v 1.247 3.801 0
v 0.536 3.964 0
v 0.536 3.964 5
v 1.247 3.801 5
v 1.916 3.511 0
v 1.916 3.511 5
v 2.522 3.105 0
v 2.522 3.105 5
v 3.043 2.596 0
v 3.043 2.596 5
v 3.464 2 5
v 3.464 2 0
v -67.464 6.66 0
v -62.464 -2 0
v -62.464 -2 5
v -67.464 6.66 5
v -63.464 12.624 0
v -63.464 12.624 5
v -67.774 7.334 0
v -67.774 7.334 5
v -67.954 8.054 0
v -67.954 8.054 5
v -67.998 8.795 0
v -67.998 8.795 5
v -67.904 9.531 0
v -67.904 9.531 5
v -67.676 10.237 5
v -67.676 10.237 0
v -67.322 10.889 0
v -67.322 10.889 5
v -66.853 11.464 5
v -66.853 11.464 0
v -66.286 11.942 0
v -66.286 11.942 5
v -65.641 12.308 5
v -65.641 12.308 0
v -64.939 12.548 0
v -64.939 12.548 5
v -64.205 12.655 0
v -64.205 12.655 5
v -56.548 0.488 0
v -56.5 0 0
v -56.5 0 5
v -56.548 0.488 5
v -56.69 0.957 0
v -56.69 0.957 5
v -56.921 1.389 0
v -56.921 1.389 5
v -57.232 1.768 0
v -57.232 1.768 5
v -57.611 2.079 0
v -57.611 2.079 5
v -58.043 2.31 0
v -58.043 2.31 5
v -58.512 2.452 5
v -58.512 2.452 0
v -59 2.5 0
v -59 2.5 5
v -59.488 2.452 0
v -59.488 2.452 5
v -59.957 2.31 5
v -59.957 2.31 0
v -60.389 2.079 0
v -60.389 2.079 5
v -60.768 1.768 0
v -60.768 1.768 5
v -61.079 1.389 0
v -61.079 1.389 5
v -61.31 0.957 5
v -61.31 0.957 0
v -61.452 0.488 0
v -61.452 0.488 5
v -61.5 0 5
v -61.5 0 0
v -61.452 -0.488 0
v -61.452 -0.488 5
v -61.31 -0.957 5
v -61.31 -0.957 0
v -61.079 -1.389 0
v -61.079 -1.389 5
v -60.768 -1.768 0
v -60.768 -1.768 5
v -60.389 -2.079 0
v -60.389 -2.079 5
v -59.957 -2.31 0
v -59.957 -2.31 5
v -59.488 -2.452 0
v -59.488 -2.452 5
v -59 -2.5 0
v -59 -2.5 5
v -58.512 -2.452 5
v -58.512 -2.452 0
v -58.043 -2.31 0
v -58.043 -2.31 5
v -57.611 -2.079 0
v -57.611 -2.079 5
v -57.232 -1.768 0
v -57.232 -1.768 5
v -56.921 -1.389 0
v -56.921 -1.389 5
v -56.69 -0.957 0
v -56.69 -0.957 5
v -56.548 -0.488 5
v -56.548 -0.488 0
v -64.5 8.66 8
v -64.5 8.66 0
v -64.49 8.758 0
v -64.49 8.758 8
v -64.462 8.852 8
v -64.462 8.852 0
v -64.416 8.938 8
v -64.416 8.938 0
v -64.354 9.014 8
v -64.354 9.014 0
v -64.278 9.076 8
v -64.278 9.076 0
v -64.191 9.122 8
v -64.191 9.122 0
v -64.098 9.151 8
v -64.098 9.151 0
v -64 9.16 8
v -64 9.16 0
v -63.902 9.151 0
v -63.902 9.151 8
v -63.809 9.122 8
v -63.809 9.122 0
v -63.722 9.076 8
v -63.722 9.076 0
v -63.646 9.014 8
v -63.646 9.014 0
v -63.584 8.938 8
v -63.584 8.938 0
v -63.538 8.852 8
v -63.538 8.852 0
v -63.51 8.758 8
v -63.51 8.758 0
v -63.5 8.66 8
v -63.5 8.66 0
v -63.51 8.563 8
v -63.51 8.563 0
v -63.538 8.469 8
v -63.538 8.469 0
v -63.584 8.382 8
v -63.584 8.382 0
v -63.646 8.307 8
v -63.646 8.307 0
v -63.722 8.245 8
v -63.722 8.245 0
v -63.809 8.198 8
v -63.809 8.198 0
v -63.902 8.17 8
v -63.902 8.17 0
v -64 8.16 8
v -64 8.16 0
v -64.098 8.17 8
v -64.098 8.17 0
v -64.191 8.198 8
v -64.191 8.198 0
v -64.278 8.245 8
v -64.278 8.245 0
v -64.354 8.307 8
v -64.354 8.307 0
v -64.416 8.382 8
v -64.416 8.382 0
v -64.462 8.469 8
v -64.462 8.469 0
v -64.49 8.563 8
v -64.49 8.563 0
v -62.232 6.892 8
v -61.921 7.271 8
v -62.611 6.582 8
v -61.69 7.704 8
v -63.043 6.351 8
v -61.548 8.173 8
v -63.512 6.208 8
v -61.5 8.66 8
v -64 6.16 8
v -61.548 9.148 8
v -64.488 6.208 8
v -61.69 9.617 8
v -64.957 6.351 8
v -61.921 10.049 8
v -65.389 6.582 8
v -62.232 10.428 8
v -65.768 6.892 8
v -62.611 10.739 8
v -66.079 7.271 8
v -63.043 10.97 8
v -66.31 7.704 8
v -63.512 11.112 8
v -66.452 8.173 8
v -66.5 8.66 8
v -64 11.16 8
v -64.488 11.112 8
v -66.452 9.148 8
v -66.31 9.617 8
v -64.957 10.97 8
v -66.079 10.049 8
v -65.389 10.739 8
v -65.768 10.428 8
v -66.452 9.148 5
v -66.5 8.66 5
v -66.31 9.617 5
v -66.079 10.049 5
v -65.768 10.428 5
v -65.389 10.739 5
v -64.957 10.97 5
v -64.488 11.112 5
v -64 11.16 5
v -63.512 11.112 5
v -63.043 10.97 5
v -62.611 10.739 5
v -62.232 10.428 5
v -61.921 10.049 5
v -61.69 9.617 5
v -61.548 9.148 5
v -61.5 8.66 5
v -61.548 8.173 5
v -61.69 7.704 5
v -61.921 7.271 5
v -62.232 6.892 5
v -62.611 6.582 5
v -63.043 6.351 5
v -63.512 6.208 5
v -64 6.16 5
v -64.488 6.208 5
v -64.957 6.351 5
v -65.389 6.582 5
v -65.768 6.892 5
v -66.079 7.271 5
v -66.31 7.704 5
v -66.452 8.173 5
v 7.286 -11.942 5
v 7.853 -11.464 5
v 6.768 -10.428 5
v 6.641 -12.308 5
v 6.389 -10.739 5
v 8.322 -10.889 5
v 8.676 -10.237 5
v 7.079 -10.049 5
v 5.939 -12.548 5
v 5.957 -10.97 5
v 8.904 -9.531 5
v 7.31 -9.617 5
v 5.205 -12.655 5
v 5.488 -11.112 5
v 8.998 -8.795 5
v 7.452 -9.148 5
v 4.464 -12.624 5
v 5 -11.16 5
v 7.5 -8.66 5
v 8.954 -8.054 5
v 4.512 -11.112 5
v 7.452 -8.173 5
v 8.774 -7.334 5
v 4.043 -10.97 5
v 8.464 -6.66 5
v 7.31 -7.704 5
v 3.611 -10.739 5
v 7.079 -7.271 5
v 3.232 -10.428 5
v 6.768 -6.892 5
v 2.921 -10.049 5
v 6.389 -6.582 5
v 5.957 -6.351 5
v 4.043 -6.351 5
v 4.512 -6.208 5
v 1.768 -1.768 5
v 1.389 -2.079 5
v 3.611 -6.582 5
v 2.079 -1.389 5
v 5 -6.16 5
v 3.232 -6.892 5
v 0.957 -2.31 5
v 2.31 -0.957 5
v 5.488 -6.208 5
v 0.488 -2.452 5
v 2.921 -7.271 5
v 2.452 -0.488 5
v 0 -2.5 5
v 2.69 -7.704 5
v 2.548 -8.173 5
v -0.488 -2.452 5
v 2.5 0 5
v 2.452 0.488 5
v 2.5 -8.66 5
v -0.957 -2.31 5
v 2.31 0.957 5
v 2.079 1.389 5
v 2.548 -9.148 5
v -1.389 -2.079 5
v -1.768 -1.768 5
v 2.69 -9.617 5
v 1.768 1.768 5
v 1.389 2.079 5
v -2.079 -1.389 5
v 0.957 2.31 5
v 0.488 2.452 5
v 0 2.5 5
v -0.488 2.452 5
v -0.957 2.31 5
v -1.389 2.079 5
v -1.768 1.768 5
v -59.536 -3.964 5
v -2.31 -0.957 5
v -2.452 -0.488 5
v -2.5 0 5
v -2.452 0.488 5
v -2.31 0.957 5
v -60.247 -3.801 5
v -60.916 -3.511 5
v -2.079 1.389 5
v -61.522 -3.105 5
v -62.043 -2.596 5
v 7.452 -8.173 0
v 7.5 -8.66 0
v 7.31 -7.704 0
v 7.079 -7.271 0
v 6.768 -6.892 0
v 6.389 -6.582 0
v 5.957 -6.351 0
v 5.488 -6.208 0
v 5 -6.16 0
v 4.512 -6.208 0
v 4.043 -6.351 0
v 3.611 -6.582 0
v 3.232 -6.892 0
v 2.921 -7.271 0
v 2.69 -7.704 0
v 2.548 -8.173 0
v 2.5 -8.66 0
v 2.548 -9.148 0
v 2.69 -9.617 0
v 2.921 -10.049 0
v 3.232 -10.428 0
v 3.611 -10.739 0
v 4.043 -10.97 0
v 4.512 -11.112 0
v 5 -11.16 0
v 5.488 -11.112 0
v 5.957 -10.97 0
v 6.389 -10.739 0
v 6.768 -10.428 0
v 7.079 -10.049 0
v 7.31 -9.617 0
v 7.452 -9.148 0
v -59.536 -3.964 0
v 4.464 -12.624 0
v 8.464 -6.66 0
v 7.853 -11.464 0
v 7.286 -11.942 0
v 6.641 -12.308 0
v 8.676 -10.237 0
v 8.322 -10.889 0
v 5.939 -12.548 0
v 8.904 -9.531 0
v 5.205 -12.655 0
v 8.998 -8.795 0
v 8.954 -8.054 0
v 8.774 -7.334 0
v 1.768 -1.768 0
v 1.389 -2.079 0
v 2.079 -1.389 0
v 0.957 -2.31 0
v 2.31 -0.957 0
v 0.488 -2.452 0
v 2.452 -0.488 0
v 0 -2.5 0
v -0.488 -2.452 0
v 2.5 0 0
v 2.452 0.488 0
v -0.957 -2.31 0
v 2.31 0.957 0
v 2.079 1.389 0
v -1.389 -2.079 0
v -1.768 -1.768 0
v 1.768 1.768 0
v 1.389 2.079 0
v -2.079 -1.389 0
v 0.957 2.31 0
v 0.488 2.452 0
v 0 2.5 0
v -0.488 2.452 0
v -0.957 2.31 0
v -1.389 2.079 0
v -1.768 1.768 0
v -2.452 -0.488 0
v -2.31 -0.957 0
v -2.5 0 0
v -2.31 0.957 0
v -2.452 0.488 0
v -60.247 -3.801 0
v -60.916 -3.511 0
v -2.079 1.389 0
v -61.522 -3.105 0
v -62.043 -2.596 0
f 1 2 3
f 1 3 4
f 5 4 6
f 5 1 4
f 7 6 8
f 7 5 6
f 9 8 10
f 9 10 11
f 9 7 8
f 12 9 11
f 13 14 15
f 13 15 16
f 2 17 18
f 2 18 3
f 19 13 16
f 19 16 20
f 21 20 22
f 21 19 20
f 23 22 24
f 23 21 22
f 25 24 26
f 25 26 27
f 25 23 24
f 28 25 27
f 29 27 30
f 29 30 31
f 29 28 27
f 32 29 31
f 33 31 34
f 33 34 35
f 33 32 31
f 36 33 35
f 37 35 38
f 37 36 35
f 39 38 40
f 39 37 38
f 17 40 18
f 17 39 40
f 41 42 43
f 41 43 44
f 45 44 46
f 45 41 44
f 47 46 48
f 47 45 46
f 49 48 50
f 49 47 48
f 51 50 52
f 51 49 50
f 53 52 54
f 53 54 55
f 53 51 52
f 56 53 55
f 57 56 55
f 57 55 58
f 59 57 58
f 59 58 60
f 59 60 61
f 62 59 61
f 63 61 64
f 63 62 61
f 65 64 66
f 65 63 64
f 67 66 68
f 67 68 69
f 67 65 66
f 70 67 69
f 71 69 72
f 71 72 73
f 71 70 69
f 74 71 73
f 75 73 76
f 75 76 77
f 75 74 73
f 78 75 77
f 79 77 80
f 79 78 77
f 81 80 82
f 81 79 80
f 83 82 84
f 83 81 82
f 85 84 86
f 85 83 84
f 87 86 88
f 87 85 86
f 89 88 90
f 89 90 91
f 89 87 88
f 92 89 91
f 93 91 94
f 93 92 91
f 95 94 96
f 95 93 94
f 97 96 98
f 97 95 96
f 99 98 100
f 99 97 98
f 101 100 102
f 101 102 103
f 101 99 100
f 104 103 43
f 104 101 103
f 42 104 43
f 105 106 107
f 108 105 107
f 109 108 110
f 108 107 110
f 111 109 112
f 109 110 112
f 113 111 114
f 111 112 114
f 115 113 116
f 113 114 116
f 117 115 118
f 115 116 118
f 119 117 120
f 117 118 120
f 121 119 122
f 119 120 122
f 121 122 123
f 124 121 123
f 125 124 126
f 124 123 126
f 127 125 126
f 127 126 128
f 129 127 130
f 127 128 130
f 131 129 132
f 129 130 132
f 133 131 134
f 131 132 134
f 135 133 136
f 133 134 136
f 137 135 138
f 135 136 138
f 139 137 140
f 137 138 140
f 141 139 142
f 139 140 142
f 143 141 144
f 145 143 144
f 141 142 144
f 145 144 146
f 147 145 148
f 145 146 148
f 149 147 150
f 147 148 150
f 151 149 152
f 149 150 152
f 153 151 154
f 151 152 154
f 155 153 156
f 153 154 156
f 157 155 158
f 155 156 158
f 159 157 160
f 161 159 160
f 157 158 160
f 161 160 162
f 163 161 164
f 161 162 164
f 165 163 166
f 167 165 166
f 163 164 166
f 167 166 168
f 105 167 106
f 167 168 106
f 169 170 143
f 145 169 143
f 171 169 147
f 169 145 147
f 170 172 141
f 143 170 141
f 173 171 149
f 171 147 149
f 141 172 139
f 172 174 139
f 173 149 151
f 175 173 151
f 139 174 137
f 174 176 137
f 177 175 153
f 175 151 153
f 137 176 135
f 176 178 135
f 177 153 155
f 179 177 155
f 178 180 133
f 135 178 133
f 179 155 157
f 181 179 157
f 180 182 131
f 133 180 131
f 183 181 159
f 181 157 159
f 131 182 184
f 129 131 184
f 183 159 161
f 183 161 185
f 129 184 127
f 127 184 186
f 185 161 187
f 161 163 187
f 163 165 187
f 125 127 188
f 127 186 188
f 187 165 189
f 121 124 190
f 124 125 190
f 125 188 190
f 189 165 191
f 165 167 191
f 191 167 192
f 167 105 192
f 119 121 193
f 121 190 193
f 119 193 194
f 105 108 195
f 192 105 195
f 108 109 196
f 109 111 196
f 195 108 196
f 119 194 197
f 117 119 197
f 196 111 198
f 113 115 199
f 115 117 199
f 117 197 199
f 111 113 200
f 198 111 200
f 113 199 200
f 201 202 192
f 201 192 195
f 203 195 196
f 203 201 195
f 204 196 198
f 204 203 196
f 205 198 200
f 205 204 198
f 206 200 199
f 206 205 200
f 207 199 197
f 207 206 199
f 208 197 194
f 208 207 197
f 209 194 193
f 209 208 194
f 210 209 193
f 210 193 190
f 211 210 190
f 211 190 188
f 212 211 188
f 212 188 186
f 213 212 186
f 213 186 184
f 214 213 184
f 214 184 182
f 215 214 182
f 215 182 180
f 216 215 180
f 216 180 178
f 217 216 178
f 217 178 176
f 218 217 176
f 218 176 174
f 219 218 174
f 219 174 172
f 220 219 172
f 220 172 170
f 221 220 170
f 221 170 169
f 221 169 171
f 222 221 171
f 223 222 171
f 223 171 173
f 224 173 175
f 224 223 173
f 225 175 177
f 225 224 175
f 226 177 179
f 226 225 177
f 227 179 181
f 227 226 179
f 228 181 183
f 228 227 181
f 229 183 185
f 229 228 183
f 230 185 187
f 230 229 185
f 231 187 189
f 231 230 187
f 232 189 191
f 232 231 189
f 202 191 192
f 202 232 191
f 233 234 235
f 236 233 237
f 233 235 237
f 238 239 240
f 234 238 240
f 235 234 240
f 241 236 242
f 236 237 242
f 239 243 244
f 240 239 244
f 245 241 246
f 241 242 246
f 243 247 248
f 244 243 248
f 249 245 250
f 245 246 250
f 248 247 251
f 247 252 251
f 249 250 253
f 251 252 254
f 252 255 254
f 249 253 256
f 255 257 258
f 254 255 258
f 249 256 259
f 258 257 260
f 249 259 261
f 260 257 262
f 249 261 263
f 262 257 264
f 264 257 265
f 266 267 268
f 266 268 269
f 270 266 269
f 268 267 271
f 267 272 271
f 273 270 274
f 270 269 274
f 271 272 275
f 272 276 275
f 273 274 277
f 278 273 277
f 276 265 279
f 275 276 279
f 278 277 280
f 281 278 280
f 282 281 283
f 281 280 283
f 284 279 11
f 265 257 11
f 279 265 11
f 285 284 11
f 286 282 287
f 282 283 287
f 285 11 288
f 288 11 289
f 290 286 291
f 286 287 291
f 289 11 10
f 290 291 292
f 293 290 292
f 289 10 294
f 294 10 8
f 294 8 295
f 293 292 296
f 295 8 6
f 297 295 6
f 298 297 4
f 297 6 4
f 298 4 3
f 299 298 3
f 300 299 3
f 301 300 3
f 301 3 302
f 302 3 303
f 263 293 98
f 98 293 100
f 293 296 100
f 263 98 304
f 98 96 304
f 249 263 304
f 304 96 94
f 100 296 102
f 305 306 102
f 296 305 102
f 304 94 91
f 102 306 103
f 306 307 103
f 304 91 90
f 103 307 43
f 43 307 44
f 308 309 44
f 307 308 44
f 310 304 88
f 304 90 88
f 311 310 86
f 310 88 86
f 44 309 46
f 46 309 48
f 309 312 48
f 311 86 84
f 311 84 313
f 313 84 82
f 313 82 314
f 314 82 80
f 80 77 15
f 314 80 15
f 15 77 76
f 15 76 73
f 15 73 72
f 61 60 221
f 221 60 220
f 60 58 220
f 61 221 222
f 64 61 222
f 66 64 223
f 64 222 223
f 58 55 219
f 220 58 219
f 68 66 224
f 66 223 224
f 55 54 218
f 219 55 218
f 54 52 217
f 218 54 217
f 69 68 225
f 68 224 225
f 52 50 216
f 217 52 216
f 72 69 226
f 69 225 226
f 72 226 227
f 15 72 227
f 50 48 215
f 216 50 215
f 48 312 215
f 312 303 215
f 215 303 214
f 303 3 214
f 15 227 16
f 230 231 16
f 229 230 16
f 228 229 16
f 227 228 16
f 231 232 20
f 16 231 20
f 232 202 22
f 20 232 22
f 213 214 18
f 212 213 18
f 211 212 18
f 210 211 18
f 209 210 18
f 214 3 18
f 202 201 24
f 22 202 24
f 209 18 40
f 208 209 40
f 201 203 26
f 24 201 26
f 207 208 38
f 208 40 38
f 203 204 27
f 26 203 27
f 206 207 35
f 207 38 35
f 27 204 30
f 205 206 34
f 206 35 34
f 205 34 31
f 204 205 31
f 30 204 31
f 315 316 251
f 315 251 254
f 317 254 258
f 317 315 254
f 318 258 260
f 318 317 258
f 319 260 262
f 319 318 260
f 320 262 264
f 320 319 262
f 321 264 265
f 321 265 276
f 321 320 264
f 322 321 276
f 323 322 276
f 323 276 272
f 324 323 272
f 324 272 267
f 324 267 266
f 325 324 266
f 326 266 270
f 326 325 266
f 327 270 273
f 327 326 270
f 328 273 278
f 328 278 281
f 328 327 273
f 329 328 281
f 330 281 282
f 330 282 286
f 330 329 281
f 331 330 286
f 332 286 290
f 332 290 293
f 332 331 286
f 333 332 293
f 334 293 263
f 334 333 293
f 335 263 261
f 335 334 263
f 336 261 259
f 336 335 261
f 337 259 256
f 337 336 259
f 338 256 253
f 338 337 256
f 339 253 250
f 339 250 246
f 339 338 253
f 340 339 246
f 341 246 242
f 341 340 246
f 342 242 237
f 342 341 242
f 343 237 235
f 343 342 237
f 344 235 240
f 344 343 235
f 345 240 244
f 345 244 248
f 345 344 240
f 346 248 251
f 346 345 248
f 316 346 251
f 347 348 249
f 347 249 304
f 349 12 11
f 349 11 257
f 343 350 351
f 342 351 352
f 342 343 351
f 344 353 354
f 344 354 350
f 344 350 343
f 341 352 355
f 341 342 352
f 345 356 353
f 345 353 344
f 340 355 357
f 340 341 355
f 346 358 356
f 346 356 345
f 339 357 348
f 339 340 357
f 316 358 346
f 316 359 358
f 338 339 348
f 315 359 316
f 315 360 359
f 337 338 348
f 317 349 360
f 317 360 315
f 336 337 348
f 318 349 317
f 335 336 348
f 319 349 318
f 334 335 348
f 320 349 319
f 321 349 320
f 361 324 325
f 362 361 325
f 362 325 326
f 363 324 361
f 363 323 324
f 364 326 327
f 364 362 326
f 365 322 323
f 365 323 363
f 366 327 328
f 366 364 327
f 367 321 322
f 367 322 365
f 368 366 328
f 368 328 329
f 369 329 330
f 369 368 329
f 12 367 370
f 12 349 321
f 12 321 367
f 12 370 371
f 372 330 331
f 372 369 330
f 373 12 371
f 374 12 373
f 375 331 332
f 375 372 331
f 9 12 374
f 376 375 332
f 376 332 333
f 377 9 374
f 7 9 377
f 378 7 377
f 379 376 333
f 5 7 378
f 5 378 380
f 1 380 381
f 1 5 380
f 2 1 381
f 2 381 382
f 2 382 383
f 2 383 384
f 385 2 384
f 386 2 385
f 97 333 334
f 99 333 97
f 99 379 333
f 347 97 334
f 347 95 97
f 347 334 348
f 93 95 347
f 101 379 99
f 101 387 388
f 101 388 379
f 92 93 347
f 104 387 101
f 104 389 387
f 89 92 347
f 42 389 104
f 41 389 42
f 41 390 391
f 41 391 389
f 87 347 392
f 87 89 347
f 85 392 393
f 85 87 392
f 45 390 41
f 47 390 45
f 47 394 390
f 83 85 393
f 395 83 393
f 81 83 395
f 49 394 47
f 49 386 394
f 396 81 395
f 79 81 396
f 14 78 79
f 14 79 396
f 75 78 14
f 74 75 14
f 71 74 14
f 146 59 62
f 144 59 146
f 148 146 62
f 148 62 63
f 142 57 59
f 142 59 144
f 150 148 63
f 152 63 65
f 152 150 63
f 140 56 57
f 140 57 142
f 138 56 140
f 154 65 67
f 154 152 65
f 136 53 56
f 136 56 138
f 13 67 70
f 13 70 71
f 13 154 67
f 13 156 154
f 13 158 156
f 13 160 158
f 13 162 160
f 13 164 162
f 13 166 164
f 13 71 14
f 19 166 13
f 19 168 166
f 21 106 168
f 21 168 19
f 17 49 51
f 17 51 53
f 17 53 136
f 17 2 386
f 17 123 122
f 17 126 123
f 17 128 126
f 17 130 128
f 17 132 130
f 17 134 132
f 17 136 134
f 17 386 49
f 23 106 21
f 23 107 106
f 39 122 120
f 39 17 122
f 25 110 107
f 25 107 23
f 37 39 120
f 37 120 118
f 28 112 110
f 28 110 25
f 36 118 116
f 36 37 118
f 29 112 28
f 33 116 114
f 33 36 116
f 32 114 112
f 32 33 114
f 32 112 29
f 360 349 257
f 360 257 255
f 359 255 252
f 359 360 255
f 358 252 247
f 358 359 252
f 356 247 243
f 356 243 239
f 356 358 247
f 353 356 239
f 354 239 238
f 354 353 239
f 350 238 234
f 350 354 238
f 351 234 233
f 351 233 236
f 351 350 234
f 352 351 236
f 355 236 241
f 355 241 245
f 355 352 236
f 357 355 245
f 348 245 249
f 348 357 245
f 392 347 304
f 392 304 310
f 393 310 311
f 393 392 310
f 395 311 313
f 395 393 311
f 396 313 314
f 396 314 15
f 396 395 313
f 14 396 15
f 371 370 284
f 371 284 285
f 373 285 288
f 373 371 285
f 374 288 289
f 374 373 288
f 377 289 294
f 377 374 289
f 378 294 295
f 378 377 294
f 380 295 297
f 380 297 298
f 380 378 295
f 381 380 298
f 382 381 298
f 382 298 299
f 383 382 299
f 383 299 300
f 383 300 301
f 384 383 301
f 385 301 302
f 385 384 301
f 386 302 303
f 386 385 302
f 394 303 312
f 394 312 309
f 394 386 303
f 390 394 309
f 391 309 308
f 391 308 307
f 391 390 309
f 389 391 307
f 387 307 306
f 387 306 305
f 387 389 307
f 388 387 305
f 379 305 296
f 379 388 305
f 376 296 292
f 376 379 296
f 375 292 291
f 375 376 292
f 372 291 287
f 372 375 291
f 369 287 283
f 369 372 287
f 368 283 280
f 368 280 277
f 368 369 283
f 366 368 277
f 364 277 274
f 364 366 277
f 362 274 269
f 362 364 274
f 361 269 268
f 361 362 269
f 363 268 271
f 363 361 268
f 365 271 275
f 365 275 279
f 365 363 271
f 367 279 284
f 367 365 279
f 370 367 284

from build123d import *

# Parameters (mm, degrees)
SKETCH2_R           = 2.5
BOSS_EXTRUDE1_DEPTH = 5
SKETCH4_R           = 2.5
SKETCH4_R_2         = 0.5
BOSS_EXTRUDE3_DEPTH = 8


with BuildPart() as part:
    # Sketch2 → Boss-Extrude1 (new body)
    with BuildSketch(Plane.XY):
        with BuildLine():
            Line((-63.463622529, 12.624128305), (0.536377471, 3.963874268))
            ThreePointArc((0.536377471, 3.963874268), (2.228263621, 3.321873152), (3.464101615, 2))
            Line((3.464101615, 2), (8.464101615, -6.660254038))
            ThreePointArc((8.464101615, -6.660254038), (8.321873152, -10.888517659), (4.463622529, -12.624128305))
            Line((4.463622529, -12.624128305), (-59.536377471, -3.963874268))
            ThreePointArc((-59.536377471, -3.963874268), (-61.228263621, -3.321873152), (-62.464101615, -2))
            Line((-62.464101615, -2), (-67.464101615, 6.660254038))
            ThreePointArc((-67.464101615, 6.660254038), (-67.321873152, 10.888517659), (-63.463622529, 12.624128305))
        make_face()
        with Locations((-59, 0)):
            Circle(SKETCH2_R, mode=Mode.SUBTRACT)
        with Locations((-64, 8.660254038)):
            Circle(SKETCH2_R, mode=Mode.SUBTRACT)
        Circle(SKETCH2_R, mode=Mode.SUBTRACT)
        with Locations((5, -8.660254038)):
            Circle(SKETCH2_R, mode=Mode.SUBTRACT)
    extrude(amount=BOSS_EXTRUDE1_DEPTH)

    # Sketch4 → Boss-Extrude3 (add)
    with BuildSketch(Plane(origin=(0, 0, 0), x_dir=(-1, 0, 0), z_dir=(0, 0, -1))):
        with Locations((64, 8.660254038)):
            Circle(SKETCH4_R)
        with Locations((64, 8.660254038)):
            Circle(SKETCH4_R_2, mode=Mode.SUBTRACT)
    extrude(amount=-BOSS_EXTRUDE3_DEPTH)


solid = part.part
